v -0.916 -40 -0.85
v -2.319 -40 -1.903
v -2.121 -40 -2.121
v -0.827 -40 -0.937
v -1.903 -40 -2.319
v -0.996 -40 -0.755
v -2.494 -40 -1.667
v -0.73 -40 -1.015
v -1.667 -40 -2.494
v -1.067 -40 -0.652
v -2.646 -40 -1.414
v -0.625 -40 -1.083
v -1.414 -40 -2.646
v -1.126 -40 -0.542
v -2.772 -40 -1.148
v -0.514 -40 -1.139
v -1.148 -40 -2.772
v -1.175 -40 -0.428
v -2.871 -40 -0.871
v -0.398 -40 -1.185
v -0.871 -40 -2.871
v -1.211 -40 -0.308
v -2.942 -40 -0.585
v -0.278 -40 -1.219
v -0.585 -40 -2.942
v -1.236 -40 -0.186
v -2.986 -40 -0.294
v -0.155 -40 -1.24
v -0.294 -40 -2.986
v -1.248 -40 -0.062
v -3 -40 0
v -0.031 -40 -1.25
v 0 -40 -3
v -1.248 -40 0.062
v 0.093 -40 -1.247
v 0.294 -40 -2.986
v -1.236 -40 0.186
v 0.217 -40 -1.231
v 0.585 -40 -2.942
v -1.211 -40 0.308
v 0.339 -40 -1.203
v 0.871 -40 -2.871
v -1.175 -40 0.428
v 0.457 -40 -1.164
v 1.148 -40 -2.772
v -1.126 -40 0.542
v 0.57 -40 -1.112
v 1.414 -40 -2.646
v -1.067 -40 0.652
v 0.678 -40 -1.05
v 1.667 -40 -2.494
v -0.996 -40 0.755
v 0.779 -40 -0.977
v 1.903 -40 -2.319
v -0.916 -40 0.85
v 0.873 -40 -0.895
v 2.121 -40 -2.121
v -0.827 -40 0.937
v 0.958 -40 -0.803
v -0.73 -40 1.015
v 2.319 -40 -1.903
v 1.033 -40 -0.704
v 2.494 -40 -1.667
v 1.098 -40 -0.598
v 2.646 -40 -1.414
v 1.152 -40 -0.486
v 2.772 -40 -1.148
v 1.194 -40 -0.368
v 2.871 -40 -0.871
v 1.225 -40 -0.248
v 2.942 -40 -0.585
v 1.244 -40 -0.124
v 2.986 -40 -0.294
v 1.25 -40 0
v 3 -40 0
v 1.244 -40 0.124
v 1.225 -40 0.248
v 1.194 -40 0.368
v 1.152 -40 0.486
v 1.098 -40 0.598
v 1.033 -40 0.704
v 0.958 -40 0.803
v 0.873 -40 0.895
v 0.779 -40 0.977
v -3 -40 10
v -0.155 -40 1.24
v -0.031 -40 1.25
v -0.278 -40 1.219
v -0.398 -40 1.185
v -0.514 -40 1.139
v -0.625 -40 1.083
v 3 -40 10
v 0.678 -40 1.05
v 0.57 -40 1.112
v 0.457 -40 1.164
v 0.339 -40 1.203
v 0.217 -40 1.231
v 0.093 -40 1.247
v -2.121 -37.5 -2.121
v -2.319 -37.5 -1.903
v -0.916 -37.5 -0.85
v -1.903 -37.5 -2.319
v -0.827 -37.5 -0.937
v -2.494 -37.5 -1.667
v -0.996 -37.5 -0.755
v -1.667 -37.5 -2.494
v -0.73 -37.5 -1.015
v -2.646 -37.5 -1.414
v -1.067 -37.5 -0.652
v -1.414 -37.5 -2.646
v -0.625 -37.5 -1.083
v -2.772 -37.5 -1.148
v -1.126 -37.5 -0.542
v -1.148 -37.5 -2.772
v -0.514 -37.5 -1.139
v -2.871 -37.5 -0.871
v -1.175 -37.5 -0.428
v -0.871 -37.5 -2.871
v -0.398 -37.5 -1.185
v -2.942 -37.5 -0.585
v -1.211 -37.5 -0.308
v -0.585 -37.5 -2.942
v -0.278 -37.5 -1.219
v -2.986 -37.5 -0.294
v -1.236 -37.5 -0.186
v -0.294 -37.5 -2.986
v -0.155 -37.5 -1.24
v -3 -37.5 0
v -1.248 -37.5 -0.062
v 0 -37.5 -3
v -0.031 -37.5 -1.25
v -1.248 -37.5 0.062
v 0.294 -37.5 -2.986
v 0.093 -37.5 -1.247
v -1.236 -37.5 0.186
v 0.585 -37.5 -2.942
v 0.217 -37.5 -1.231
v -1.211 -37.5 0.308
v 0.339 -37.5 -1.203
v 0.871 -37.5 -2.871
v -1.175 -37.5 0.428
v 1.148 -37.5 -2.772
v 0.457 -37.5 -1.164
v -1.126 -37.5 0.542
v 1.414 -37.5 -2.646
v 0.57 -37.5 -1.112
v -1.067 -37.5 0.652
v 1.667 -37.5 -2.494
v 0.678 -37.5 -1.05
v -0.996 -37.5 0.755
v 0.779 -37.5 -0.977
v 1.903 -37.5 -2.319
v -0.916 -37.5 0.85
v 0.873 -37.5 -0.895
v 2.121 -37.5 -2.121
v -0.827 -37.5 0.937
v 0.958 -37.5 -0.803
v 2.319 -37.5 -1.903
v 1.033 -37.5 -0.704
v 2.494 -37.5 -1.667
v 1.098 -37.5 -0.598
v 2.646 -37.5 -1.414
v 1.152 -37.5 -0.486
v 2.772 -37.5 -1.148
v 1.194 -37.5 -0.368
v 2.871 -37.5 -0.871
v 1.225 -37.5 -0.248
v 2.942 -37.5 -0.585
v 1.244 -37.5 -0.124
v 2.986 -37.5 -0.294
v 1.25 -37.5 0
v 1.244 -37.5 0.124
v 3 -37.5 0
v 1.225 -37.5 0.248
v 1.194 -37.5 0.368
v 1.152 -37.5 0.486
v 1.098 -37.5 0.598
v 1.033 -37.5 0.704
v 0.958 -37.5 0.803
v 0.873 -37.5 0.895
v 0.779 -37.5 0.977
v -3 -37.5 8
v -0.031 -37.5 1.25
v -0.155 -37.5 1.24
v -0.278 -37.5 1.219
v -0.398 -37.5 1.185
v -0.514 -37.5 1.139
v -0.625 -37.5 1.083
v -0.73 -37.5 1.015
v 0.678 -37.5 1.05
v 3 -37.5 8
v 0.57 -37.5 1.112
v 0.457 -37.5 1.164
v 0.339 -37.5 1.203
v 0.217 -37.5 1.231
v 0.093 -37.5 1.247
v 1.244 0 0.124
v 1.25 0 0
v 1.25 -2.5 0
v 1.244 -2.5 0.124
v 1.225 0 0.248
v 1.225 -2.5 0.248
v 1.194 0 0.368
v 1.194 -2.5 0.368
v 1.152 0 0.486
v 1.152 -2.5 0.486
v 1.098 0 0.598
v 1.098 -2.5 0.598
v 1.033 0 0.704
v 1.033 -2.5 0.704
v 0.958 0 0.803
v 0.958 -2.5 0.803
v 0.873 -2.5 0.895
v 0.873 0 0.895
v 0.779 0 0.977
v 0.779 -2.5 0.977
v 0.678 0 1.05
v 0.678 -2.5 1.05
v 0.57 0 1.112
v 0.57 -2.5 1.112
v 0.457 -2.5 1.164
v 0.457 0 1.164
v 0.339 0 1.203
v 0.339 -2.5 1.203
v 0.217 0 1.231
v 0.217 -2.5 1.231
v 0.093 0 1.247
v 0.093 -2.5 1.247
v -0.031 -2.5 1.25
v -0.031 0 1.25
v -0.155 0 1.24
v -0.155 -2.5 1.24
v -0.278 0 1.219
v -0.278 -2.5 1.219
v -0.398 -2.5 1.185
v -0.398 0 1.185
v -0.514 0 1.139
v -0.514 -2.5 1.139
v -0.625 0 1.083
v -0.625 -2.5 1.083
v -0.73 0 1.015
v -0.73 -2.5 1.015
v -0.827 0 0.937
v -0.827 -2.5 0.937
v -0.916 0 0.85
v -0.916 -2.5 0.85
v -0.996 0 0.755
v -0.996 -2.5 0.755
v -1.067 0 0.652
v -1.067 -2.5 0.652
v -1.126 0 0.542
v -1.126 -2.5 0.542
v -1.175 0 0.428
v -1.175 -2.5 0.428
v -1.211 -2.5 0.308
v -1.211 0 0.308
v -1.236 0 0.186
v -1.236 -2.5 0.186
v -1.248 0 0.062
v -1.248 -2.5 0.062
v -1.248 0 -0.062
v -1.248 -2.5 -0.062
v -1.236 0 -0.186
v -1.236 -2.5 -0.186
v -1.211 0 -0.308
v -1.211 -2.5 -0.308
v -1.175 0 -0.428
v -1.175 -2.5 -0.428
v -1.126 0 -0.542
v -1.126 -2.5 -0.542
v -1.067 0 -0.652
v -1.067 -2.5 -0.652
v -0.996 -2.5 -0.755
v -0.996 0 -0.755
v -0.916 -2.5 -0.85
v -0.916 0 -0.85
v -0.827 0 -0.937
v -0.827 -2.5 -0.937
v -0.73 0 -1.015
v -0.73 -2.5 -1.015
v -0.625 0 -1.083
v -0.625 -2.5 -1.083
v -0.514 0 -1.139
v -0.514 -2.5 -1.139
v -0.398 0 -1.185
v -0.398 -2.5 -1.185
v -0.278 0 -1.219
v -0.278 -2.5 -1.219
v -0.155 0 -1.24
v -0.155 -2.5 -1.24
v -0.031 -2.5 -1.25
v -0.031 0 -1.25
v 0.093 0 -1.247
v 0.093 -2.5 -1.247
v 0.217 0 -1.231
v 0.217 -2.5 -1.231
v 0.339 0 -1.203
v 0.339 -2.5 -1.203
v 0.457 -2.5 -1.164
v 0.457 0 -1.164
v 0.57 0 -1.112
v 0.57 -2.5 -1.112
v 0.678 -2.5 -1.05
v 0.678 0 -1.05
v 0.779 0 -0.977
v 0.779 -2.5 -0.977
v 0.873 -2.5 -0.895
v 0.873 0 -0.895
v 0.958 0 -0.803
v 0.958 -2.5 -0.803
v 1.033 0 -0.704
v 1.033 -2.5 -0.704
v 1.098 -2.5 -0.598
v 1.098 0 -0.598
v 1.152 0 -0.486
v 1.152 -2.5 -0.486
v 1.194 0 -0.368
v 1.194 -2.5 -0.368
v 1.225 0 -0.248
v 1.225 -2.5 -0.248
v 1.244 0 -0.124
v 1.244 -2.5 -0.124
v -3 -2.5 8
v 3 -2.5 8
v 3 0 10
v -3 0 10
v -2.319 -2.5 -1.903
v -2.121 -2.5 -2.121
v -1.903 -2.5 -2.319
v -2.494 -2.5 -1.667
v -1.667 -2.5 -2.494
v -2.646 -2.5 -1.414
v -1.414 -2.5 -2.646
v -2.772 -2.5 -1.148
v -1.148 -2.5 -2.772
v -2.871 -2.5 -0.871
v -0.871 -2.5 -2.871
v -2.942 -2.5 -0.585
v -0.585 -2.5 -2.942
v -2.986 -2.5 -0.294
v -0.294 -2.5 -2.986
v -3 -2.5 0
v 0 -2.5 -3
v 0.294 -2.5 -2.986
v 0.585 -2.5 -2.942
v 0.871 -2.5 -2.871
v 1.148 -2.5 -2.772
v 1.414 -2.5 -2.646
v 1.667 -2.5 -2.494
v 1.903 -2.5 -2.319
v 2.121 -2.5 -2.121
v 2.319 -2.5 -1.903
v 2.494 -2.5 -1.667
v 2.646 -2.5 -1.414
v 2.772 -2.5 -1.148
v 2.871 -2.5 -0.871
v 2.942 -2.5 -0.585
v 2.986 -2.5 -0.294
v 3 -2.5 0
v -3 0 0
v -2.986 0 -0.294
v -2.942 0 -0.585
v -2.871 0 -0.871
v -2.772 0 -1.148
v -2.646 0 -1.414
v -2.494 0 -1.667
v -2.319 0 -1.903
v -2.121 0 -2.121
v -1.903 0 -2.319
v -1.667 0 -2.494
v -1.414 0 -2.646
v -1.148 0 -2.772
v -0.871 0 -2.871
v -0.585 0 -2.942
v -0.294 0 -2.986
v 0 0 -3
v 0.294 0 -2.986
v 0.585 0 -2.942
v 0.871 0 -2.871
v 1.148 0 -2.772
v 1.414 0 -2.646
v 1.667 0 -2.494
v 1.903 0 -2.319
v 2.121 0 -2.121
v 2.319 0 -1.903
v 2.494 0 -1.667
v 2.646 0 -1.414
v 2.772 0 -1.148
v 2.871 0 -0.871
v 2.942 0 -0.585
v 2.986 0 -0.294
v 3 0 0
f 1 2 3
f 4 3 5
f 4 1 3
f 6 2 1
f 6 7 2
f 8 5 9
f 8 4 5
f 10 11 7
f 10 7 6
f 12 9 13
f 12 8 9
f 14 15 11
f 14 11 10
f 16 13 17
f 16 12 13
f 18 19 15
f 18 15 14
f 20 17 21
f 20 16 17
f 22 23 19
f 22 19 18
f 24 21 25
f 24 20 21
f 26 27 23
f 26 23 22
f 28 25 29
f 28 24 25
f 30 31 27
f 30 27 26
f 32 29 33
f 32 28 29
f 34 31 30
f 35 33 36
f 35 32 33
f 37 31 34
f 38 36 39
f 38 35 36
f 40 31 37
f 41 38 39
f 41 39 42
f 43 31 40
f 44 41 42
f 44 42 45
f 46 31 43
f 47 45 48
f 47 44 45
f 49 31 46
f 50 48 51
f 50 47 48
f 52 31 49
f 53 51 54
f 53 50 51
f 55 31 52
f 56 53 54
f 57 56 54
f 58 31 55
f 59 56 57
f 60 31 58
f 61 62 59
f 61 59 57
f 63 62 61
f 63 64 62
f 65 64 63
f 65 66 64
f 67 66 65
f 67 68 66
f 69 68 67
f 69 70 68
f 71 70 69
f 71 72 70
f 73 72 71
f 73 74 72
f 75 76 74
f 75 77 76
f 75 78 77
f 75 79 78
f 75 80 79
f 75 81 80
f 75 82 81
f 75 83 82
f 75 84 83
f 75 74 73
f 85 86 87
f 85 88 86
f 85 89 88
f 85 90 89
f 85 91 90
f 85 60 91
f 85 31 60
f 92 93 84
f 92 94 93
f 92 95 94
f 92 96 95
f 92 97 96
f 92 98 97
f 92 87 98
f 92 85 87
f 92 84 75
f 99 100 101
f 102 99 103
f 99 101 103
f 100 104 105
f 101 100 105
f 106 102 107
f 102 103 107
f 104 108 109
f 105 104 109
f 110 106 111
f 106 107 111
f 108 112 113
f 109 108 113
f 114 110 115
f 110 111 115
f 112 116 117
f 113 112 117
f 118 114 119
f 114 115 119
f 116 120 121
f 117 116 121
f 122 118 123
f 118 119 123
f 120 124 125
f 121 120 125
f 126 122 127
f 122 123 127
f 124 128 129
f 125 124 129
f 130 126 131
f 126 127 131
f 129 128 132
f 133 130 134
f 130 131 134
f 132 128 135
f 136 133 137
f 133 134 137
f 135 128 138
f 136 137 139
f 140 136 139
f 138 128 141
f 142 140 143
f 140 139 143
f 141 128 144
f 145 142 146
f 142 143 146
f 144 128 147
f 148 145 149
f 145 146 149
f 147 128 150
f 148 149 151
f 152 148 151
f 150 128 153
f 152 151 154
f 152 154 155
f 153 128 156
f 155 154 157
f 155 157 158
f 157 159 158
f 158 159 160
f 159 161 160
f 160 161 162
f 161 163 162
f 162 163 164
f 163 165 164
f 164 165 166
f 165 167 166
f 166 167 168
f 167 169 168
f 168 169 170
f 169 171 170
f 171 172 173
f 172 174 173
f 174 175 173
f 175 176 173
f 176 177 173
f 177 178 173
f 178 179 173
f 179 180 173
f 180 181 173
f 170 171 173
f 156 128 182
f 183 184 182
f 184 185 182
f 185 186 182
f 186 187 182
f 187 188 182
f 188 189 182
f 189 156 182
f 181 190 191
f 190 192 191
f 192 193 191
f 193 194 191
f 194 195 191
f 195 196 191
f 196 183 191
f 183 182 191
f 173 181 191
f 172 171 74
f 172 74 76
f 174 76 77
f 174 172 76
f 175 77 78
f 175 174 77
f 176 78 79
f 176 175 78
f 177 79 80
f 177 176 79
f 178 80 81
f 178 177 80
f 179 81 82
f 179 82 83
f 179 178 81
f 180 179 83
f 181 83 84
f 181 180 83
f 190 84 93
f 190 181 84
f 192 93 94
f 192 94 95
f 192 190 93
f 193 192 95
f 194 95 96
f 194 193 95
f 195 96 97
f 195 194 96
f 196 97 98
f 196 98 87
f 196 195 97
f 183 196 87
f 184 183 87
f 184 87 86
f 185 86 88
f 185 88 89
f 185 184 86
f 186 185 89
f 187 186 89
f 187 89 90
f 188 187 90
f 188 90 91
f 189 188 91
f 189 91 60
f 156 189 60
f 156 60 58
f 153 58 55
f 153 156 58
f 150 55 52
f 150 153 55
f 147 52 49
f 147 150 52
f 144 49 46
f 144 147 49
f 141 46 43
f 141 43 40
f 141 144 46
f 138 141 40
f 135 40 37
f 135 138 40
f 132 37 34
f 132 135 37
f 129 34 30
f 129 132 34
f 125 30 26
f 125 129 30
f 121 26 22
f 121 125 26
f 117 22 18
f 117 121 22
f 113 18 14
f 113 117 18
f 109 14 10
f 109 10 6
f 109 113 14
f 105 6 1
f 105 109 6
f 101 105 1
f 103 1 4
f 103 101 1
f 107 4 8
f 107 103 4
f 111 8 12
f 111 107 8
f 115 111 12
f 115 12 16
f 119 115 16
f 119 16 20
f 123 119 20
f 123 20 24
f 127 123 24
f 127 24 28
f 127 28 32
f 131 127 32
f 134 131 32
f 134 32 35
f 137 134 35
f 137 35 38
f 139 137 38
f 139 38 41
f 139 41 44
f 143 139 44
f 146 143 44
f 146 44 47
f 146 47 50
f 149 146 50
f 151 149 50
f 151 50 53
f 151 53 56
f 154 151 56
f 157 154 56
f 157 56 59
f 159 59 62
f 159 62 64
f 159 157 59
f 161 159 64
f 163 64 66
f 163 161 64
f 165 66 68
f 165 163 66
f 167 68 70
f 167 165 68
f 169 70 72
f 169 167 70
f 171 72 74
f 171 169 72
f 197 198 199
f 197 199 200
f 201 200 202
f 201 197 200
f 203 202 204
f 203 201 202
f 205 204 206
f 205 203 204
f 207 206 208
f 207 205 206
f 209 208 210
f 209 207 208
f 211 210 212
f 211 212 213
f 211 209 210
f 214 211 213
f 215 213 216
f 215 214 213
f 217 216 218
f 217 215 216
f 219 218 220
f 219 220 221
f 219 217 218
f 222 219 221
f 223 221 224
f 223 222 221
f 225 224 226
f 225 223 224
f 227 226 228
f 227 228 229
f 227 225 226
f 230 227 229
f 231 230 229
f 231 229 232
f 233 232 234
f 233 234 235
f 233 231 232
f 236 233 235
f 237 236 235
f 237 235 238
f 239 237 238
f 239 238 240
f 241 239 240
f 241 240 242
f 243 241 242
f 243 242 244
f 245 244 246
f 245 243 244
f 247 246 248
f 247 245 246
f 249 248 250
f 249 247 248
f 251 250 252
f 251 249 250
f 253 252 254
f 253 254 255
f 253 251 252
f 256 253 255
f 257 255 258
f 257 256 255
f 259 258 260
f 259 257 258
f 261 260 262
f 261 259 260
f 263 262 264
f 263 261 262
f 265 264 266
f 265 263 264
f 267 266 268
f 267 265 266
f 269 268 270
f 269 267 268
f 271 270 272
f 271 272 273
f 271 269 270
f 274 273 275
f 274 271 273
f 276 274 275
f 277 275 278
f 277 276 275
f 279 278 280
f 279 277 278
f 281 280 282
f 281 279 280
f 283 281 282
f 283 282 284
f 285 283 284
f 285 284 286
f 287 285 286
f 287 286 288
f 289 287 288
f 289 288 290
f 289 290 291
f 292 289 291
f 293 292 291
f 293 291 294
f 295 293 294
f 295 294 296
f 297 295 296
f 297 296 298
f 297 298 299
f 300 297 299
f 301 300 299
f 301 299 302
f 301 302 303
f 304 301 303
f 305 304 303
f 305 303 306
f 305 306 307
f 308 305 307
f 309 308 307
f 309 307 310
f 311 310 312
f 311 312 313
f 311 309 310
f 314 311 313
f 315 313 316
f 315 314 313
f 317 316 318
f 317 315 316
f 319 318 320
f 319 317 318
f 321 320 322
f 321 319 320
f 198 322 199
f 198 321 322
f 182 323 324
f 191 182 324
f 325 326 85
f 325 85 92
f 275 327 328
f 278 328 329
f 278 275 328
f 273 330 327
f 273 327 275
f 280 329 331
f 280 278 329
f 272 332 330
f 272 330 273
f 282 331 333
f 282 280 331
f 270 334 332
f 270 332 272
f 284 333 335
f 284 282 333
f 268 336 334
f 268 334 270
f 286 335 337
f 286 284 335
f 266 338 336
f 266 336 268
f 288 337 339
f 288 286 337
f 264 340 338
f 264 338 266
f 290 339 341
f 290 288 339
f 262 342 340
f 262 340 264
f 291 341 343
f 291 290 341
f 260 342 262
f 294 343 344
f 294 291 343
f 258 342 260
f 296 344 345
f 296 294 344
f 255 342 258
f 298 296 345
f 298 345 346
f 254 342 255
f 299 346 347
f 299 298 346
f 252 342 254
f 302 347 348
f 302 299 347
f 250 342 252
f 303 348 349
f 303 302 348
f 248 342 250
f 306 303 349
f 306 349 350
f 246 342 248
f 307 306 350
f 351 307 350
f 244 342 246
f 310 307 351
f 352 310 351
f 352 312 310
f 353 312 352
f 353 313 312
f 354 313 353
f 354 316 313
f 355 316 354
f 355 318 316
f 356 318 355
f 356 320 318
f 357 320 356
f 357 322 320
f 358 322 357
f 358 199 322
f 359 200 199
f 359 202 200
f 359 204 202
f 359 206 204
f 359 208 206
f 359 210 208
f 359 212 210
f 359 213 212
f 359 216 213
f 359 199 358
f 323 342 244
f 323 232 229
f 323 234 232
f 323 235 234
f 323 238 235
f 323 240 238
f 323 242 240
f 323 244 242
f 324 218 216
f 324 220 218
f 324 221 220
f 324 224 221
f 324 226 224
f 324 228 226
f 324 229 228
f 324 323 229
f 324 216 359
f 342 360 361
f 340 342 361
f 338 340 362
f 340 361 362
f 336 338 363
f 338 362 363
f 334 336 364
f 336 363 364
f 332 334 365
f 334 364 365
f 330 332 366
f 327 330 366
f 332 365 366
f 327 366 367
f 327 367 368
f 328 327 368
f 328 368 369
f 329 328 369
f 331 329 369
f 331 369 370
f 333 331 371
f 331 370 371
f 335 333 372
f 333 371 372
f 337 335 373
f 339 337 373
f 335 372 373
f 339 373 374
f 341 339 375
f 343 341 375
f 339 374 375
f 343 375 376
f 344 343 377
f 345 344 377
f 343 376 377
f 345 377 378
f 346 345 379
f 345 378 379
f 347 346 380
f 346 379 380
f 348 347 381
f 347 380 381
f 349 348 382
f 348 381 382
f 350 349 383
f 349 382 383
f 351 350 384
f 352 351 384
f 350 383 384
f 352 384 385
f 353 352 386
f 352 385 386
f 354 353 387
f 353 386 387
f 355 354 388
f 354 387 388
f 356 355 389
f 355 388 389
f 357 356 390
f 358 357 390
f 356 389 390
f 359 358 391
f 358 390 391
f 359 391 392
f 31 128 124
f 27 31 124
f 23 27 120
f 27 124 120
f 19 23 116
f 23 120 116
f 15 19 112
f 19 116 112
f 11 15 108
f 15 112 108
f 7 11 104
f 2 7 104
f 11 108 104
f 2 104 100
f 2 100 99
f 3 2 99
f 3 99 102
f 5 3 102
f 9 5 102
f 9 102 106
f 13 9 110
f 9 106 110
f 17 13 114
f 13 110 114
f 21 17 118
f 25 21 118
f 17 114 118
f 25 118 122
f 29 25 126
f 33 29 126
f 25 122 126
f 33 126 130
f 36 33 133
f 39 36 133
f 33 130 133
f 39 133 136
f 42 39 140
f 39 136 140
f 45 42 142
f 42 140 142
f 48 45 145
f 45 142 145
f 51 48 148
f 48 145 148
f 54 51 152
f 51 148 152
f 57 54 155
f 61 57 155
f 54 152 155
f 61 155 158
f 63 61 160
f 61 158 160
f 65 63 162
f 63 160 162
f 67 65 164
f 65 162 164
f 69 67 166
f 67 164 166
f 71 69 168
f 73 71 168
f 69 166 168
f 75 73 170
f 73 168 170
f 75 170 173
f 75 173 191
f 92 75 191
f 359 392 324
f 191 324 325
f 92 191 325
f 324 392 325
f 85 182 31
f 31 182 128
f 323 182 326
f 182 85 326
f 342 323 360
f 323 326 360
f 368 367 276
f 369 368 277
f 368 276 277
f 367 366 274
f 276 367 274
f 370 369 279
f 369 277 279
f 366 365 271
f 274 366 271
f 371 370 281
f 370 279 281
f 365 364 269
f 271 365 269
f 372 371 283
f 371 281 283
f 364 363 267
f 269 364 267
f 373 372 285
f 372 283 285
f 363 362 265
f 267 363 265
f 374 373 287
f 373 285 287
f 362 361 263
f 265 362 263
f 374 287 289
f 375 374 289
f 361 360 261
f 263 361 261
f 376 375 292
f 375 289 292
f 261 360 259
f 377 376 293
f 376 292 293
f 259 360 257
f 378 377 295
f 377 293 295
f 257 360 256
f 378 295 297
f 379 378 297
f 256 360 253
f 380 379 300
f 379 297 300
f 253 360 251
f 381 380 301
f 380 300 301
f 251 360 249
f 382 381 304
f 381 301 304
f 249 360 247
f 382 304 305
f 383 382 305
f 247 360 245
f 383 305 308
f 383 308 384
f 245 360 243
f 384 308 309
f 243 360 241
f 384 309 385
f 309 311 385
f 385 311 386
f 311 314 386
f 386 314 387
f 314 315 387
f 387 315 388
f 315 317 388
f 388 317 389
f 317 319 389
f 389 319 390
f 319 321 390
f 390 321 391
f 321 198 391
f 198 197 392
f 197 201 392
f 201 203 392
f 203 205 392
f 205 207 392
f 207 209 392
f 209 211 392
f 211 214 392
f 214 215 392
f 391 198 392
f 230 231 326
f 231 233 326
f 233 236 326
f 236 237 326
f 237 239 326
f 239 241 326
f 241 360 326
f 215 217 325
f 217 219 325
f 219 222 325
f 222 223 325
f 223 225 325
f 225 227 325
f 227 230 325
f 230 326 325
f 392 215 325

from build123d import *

# Parameters (mm, degrees)
F0_W     = 6
F0_H     = 2
F1_DEPTH = 40
F0_R     = 1.25
F2_DEPTH = 2.5
F3_START = 37.5
F3_DEPTH = 2.5


with BuildPart() as f1:
    # F0 (on Front) → F1 (new body)
    with BuildSketch(Plane.XZ):
        with Locations((0, 9)):
            Rectangle(F0_W, F0_H)
    extrude(amount=F1_DEPTH)

    # F0 (on Front) → F2 (join)
    with BuildSketch(Plane.XZ):
        with BuildLine():
            Line((-3, 8), (-3, 0))
            ThreePointArc((-3, 0), (0, -3), (3, 0))
            Line((3, 0), (3, 8))
            Line((3, 8), (-3, 8))
        make_face()
        Circle(F0_R, mode=Mode.SUBTRACT)
    extrude(amount=F2_DEPTH)

    # F0 (on Front) → F3 (join)
    with BuildSketch(Plane.XZ.offset(F3_START)):
        with BuildLine():
            Line((-3, 8), (-3, 0))
            ThreePointArc((-3, 0), (0, -3), (3, 0))
            Line((3, 0), (3, 8))
            Line((3, 8), (-3, 8))
        make_face()
        Circle(F0_R, mode=Mode.SUBTRACT)
    extrude(amount=F3_DEPTH)


solid = f1.part
